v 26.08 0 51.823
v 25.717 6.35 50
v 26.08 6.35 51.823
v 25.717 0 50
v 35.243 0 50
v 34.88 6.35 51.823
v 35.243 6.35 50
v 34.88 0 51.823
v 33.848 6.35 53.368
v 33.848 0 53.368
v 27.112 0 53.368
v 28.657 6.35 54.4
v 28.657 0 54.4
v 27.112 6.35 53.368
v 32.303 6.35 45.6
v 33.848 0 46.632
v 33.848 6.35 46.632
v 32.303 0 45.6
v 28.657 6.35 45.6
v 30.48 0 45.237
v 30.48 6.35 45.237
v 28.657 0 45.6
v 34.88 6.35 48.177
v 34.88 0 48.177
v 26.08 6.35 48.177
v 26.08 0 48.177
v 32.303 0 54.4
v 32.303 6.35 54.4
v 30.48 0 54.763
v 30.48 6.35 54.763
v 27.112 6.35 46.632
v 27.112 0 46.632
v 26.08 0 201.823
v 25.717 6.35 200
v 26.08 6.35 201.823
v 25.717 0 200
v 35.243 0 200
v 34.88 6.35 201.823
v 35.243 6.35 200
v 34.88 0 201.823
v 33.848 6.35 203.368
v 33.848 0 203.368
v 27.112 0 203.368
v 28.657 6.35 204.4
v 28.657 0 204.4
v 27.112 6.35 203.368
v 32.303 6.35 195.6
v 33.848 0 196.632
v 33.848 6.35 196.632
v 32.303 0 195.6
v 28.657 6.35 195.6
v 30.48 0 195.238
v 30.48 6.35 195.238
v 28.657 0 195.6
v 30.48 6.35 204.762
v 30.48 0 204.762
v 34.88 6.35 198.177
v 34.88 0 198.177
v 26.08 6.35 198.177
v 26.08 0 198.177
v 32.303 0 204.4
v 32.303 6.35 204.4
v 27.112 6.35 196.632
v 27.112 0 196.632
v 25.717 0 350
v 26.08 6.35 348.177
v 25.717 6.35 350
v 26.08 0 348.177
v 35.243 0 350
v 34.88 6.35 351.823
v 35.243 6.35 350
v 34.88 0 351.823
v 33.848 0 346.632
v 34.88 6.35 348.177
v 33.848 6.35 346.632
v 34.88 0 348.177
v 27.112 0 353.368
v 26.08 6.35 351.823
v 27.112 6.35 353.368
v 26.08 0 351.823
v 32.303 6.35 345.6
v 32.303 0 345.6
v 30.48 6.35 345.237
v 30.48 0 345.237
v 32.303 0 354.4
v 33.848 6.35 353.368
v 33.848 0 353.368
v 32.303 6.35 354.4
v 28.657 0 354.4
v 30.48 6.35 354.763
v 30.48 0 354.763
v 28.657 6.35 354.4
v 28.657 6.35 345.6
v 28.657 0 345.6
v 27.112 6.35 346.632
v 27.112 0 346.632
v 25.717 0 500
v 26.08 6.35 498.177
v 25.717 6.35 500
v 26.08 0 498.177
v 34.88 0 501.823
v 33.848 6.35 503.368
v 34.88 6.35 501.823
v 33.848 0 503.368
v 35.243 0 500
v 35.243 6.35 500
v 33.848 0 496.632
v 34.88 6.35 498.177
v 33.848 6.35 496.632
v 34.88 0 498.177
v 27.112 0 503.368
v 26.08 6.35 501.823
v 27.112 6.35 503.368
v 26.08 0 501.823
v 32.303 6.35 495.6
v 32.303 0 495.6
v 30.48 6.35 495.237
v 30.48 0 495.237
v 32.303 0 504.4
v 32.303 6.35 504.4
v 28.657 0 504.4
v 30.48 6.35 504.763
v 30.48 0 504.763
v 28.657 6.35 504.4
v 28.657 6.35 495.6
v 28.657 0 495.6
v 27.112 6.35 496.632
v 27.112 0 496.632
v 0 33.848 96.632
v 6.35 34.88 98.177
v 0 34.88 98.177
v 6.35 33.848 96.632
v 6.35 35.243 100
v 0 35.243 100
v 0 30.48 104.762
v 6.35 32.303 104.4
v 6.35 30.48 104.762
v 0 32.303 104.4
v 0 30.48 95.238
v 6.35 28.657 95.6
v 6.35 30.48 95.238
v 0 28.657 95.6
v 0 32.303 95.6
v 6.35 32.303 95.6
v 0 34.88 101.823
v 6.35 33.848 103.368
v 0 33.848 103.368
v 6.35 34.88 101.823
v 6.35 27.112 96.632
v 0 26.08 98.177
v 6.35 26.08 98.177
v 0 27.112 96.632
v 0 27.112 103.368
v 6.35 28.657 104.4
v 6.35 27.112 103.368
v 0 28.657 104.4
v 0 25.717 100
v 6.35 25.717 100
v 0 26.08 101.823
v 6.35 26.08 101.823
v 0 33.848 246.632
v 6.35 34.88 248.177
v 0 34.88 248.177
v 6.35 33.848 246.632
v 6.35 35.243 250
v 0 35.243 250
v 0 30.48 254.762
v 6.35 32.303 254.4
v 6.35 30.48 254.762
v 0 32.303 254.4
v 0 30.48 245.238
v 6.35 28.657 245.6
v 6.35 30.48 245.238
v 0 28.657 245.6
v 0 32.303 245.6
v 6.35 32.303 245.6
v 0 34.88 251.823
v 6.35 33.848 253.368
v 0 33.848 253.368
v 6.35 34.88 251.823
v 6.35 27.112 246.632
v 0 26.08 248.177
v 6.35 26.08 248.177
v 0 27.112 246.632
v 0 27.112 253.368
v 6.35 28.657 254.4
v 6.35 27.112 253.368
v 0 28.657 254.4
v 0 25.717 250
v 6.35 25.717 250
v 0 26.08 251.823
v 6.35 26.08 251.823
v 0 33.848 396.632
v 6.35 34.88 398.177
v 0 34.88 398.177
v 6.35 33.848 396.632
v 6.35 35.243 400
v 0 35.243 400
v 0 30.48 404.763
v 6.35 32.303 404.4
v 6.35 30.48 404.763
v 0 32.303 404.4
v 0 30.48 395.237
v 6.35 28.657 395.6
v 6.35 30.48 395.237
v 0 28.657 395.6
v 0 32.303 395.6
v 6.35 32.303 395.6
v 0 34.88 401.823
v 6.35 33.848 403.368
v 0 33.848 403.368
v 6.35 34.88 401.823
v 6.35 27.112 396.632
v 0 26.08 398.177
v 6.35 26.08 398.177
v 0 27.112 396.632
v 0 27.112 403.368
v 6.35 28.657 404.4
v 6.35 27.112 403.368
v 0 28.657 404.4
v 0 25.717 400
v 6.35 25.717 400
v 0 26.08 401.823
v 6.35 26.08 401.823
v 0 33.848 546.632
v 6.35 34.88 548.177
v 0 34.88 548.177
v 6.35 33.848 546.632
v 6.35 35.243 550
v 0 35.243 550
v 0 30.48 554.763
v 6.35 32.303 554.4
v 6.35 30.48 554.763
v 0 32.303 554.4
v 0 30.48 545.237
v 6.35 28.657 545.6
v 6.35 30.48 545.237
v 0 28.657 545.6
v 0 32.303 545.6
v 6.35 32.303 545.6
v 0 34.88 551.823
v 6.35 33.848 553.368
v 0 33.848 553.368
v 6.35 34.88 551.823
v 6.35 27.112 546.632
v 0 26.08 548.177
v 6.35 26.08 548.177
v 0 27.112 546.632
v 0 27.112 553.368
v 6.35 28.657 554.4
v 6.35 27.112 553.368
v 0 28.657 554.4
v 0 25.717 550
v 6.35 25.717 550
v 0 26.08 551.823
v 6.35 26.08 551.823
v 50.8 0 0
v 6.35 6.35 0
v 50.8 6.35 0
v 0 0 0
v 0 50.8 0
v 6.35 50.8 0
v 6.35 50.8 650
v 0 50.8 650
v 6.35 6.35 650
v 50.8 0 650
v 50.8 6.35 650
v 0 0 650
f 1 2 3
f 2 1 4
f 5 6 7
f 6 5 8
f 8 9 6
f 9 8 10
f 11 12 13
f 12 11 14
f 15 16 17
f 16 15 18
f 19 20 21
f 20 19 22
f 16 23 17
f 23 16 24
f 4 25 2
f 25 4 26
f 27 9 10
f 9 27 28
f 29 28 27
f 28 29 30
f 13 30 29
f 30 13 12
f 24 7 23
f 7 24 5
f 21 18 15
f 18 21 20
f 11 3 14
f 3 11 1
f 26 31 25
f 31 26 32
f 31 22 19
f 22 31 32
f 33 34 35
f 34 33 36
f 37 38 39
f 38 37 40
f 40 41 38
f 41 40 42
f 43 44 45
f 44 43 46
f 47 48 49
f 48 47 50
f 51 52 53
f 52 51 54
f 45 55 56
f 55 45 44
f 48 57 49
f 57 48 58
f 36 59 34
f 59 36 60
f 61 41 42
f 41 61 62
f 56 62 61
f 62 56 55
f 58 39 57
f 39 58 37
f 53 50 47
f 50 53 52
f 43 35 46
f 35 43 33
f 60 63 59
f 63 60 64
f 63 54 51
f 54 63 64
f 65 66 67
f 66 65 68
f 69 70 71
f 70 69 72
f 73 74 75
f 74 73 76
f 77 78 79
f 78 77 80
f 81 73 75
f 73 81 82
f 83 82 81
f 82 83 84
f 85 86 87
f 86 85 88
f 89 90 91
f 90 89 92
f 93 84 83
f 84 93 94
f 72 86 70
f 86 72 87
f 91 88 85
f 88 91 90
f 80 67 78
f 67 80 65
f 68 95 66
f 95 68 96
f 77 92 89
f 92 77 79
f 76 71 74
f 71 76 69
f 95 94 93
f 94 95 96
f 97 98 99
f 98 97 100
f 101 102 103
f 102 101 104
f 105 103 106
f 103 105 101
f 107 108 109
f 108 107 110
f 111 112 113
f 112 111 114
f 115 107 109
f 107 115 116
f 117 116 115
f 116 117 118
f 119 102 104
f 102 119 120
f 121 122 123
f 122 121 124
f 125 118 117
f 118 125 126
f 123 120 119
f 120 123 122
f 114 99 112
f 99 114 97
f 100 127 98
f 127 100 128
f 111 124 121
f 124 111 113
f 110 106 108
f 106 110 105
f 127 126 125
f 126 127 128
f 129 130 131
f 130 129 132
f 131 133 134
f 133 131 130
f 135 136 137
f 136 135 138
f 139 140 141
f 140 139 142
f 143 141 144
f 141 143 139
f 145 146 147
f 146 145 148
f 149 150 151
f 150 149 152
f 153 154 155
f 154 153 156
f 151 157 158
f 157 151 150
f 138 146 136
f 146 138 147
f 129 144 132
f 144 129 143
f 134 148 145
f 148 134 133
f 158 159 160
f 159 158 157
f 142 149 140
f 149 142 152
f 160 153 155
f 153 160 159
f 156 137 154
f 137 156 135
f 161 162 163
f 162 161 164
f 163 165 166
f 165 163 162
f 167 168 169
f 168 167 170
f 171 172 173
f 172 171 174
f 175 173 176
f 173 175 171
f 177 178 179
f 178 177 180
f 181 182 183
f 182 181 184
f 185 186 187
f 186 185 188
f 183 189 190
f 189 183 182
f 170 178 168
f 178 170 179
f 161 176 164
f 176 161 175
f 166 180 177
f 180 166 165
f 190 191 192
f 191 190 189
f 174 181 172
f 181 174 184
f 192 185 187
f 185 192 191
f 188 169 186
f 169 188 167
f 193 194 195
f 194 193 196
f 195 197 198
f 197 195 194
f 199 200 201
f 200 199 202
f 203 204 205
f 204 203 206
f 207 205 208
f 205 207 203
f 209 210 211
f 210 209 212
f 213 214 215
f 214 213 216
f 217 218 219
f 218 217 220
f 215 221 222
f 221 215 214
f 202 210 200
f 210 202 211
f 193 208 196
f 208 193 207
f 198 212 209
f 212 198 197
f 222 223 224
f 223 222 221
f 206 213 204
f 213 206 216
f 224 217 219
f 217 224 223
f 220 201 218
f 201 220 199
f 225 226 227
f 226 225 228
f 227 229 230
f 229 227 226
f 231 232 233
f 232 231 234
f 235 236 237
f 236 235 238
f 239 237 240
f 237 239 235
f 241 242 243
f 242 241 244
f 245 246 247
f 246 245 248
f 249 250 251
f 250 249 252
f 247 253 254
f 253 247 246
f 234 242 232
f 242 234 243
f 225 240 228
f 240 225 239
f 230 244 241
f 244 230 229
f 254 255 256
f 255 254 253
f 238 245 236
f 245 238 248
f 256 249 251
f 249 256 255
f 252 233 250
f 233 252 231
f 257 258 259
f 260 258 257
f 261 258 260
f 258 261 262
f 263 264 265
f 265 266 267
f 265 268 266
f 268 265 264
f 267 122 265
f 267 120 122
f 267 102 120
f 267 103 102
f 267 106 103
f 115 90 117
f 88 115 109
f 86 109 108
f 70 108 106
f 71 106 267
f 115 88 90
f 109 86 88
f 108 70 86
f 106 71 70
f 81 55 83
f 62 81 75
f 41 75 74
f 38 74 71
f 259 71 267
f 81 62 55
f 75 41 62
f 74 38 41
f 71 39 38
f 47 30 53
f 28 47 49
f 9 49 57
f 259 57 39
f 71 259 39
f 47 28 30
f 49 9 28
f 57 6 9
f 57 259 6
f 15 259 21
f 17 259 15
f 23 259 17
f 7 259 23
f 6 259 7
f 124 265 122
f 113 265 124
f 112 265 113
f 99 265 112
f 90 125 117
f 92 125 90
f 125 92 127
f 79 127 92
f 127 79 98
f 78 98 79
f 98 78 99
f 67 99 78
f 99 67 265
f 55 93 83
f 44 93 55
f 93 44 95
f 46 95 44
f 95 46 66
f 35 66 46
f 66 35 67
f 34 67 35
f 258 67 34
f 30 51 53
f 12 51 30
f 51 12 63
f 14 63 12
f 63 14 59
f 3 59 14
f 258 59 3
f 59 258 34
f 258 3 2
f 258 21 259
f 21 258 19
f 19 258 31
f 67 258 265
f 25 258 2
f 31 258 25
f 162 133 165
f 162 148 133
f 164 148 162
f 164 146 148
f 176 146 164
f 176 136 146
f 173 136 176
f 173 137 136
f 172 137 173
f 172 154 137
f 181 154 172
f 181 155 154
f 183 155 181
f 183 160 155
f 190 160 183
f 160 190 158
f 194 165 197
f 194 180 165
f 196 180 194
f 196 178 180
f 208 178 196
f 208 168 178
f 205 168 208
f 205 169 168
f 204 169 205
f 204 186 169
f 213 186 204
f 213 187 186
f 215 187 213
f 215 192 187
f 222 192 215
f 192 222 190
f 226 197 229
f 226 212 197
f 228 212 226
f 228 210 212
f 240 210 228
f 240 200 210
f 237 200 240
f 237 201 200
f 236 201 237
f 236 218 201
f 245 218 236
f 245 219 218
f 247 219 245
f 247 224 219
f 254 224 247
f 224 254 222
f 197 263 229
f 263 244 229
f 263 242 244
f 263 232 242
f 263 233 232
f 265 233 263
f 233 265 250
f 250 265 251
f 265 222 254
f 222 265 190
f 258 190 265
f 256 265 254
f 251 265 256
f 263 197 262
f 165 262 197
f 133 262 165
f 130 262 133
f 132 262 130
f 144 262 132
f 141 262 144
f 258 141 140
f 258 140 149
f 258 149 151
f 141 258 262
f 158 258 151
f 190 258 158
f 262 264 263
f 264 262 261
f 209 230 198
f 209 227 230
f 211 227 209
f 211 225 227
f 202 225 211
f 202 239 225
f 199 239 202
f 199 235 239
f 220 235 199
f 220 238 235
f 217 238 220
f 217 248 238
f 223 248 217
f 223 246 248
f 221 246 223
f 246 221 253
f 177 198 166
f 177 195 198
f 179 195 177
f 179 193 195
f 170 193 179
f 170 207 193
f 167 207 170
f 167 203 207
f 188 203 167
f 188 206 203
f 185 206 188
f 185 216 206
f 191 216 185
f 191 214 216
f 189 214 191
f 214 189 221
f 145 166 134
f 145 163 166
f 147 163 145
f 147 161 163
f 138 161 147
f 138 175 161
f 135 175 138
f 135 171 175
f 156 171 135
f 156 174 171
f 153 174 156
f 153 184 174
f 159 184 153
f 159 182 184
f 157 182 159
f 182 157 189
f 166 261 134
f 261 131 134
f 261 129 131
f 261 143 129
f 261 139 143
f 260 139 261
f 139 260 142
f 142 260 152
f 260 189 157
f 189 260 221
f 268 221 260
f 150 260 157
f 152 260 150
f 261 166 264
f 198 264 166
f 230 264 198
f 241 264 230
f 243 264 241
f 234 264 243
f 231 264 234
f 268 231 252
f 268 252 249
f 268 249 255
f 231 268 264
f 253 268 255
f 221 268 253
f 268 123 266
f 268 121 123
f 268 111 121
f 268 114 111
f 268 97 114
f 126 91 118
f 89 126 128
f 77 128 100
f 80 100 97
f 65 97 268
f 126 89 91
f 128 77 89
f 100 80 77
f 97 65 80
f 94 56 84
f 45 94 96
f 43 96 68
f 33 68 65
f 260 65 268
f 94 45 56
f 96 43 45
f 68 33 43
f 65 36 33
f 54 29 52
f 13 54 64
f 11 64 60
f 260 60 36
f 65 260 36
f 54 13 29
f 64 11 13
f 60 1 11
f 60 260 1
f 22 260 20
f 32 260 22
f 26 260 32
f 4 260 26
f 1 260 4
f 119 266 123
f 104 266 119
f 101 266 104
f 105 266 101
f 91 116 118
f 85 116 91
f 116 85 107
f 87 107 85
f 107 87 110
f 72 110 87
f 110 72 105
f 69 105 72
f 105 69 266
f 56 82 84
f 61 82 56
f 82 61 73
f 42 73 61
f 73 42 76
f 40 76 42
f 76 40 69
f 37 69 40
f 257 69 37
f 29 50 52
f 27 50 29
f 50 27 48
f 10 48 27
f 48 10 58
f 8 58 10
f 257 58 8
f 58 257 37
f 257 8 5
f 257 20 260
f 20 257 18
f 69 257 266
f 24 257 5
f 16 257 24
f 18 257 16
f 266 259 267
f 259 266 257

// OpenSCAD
// Part A2: Back Stiffener - Inner Wall Vertical Angle Iron
// Material: 2"×2"×1/4" Angle Iron (50.8mm × 6.35mm)
// Quantity: 4 pieces (2 per inner panel, both sides)
// Location: Back stiffener plate, adjacent to inner wall panels
//
// This file defines a single structural steel part used in the LifeTrac v25 assembly.

include <../../lifetrac_v25_params.scad>

// =============================================================================
// PART DIMENSIONS
// =============================================================================

_back_z_start = FRAME_Z_OFFSET + 350;
_back_z_end = FRAME_Z_OFFSET + MACHINE_HEIGHT;

PART_A2_HEIGHT = _back_z_end - _back_z_start;
PART_A2_LEG = 50.8;
PART_A2_THICK = 6.35;
PART_A2_BOLT_DIA = 9.525;
PART_A2_HOLE_OFFSET = PART_A2_LEG * 0.6;

// Hole patterns (same as A1)
function _get_holes_a(h) = 
    let(start=50, end=50, spacing=150, count=floor((h-start-end)/spacing)+1)
    [for (i=[0:count-1]) start + i*spacing];

function _get_holes_b(h) = 
    let(start=100, end=50, spacing=150, count=floor((h-start-end)/spacing)+1)
    [for (i=[0:count-1]) start + i*spacing];

PART_A2_HOLES_LEG_A = _get_holes_a(PART_A2_HEIGHT);
PART_A2_HOLES_LEG_B = _get_holes_b(PART_A2_HEIGHT);

// =============================================================================
// MAIN MODULE
// =============================================================================

/**
 * Part A2: Back Stiffener Inner Wall Vertical Angle Iron
 * Identical dimensions to A1, used in 4 locations on inner panels
 */
module _part_a2_back_inner_vertical(show_holes=true) {
    height = PART_A2_HEIGHT;
    leg = PART_A2_LEG;
    thick = PART_A2_THICK;
    bolt_dia = PART_A2_BOLT_DIA;
    hole_offset = PART_A2_HOLE_OFFSET;
    
    color("DarkGray")
    difference() {
        linear_extrude(height=height)
        polygon([
            [0, 0],
            [leg, 0],
            [leg, thick],
            [thick, thick],
            [thick, leg],
            [0, leg]
        ]);
        
        if (show_holes) {
            for (z = PART_A2_HOLES_LEG_A) {
                translate([hole_offset, 0, z])
                rotate([90, 0, 0])
                cylinder(d=bolt_dia, h=40, center=true, $fn=16);
            }
            
            for (z = PART_A2_HOLES_LEG_B) {
                translate([0, hole_offset, z])
                rotate([0, 90, 0])
                cylinder(d=bolt_dia, h=40, center=true, $fn=16);
            }
        }
    }
}

// =============================================================================
// RENDER
// =============================================================================

_part_a2_back_inner_vertical(show_holes=true);

echo("=== PART A2: Back Stiffener Inner Wall Vertical ===");
echo("Height:", PART_A2_HEIGHT, "mm");
echo("Quantity needed: 4 pieces");
